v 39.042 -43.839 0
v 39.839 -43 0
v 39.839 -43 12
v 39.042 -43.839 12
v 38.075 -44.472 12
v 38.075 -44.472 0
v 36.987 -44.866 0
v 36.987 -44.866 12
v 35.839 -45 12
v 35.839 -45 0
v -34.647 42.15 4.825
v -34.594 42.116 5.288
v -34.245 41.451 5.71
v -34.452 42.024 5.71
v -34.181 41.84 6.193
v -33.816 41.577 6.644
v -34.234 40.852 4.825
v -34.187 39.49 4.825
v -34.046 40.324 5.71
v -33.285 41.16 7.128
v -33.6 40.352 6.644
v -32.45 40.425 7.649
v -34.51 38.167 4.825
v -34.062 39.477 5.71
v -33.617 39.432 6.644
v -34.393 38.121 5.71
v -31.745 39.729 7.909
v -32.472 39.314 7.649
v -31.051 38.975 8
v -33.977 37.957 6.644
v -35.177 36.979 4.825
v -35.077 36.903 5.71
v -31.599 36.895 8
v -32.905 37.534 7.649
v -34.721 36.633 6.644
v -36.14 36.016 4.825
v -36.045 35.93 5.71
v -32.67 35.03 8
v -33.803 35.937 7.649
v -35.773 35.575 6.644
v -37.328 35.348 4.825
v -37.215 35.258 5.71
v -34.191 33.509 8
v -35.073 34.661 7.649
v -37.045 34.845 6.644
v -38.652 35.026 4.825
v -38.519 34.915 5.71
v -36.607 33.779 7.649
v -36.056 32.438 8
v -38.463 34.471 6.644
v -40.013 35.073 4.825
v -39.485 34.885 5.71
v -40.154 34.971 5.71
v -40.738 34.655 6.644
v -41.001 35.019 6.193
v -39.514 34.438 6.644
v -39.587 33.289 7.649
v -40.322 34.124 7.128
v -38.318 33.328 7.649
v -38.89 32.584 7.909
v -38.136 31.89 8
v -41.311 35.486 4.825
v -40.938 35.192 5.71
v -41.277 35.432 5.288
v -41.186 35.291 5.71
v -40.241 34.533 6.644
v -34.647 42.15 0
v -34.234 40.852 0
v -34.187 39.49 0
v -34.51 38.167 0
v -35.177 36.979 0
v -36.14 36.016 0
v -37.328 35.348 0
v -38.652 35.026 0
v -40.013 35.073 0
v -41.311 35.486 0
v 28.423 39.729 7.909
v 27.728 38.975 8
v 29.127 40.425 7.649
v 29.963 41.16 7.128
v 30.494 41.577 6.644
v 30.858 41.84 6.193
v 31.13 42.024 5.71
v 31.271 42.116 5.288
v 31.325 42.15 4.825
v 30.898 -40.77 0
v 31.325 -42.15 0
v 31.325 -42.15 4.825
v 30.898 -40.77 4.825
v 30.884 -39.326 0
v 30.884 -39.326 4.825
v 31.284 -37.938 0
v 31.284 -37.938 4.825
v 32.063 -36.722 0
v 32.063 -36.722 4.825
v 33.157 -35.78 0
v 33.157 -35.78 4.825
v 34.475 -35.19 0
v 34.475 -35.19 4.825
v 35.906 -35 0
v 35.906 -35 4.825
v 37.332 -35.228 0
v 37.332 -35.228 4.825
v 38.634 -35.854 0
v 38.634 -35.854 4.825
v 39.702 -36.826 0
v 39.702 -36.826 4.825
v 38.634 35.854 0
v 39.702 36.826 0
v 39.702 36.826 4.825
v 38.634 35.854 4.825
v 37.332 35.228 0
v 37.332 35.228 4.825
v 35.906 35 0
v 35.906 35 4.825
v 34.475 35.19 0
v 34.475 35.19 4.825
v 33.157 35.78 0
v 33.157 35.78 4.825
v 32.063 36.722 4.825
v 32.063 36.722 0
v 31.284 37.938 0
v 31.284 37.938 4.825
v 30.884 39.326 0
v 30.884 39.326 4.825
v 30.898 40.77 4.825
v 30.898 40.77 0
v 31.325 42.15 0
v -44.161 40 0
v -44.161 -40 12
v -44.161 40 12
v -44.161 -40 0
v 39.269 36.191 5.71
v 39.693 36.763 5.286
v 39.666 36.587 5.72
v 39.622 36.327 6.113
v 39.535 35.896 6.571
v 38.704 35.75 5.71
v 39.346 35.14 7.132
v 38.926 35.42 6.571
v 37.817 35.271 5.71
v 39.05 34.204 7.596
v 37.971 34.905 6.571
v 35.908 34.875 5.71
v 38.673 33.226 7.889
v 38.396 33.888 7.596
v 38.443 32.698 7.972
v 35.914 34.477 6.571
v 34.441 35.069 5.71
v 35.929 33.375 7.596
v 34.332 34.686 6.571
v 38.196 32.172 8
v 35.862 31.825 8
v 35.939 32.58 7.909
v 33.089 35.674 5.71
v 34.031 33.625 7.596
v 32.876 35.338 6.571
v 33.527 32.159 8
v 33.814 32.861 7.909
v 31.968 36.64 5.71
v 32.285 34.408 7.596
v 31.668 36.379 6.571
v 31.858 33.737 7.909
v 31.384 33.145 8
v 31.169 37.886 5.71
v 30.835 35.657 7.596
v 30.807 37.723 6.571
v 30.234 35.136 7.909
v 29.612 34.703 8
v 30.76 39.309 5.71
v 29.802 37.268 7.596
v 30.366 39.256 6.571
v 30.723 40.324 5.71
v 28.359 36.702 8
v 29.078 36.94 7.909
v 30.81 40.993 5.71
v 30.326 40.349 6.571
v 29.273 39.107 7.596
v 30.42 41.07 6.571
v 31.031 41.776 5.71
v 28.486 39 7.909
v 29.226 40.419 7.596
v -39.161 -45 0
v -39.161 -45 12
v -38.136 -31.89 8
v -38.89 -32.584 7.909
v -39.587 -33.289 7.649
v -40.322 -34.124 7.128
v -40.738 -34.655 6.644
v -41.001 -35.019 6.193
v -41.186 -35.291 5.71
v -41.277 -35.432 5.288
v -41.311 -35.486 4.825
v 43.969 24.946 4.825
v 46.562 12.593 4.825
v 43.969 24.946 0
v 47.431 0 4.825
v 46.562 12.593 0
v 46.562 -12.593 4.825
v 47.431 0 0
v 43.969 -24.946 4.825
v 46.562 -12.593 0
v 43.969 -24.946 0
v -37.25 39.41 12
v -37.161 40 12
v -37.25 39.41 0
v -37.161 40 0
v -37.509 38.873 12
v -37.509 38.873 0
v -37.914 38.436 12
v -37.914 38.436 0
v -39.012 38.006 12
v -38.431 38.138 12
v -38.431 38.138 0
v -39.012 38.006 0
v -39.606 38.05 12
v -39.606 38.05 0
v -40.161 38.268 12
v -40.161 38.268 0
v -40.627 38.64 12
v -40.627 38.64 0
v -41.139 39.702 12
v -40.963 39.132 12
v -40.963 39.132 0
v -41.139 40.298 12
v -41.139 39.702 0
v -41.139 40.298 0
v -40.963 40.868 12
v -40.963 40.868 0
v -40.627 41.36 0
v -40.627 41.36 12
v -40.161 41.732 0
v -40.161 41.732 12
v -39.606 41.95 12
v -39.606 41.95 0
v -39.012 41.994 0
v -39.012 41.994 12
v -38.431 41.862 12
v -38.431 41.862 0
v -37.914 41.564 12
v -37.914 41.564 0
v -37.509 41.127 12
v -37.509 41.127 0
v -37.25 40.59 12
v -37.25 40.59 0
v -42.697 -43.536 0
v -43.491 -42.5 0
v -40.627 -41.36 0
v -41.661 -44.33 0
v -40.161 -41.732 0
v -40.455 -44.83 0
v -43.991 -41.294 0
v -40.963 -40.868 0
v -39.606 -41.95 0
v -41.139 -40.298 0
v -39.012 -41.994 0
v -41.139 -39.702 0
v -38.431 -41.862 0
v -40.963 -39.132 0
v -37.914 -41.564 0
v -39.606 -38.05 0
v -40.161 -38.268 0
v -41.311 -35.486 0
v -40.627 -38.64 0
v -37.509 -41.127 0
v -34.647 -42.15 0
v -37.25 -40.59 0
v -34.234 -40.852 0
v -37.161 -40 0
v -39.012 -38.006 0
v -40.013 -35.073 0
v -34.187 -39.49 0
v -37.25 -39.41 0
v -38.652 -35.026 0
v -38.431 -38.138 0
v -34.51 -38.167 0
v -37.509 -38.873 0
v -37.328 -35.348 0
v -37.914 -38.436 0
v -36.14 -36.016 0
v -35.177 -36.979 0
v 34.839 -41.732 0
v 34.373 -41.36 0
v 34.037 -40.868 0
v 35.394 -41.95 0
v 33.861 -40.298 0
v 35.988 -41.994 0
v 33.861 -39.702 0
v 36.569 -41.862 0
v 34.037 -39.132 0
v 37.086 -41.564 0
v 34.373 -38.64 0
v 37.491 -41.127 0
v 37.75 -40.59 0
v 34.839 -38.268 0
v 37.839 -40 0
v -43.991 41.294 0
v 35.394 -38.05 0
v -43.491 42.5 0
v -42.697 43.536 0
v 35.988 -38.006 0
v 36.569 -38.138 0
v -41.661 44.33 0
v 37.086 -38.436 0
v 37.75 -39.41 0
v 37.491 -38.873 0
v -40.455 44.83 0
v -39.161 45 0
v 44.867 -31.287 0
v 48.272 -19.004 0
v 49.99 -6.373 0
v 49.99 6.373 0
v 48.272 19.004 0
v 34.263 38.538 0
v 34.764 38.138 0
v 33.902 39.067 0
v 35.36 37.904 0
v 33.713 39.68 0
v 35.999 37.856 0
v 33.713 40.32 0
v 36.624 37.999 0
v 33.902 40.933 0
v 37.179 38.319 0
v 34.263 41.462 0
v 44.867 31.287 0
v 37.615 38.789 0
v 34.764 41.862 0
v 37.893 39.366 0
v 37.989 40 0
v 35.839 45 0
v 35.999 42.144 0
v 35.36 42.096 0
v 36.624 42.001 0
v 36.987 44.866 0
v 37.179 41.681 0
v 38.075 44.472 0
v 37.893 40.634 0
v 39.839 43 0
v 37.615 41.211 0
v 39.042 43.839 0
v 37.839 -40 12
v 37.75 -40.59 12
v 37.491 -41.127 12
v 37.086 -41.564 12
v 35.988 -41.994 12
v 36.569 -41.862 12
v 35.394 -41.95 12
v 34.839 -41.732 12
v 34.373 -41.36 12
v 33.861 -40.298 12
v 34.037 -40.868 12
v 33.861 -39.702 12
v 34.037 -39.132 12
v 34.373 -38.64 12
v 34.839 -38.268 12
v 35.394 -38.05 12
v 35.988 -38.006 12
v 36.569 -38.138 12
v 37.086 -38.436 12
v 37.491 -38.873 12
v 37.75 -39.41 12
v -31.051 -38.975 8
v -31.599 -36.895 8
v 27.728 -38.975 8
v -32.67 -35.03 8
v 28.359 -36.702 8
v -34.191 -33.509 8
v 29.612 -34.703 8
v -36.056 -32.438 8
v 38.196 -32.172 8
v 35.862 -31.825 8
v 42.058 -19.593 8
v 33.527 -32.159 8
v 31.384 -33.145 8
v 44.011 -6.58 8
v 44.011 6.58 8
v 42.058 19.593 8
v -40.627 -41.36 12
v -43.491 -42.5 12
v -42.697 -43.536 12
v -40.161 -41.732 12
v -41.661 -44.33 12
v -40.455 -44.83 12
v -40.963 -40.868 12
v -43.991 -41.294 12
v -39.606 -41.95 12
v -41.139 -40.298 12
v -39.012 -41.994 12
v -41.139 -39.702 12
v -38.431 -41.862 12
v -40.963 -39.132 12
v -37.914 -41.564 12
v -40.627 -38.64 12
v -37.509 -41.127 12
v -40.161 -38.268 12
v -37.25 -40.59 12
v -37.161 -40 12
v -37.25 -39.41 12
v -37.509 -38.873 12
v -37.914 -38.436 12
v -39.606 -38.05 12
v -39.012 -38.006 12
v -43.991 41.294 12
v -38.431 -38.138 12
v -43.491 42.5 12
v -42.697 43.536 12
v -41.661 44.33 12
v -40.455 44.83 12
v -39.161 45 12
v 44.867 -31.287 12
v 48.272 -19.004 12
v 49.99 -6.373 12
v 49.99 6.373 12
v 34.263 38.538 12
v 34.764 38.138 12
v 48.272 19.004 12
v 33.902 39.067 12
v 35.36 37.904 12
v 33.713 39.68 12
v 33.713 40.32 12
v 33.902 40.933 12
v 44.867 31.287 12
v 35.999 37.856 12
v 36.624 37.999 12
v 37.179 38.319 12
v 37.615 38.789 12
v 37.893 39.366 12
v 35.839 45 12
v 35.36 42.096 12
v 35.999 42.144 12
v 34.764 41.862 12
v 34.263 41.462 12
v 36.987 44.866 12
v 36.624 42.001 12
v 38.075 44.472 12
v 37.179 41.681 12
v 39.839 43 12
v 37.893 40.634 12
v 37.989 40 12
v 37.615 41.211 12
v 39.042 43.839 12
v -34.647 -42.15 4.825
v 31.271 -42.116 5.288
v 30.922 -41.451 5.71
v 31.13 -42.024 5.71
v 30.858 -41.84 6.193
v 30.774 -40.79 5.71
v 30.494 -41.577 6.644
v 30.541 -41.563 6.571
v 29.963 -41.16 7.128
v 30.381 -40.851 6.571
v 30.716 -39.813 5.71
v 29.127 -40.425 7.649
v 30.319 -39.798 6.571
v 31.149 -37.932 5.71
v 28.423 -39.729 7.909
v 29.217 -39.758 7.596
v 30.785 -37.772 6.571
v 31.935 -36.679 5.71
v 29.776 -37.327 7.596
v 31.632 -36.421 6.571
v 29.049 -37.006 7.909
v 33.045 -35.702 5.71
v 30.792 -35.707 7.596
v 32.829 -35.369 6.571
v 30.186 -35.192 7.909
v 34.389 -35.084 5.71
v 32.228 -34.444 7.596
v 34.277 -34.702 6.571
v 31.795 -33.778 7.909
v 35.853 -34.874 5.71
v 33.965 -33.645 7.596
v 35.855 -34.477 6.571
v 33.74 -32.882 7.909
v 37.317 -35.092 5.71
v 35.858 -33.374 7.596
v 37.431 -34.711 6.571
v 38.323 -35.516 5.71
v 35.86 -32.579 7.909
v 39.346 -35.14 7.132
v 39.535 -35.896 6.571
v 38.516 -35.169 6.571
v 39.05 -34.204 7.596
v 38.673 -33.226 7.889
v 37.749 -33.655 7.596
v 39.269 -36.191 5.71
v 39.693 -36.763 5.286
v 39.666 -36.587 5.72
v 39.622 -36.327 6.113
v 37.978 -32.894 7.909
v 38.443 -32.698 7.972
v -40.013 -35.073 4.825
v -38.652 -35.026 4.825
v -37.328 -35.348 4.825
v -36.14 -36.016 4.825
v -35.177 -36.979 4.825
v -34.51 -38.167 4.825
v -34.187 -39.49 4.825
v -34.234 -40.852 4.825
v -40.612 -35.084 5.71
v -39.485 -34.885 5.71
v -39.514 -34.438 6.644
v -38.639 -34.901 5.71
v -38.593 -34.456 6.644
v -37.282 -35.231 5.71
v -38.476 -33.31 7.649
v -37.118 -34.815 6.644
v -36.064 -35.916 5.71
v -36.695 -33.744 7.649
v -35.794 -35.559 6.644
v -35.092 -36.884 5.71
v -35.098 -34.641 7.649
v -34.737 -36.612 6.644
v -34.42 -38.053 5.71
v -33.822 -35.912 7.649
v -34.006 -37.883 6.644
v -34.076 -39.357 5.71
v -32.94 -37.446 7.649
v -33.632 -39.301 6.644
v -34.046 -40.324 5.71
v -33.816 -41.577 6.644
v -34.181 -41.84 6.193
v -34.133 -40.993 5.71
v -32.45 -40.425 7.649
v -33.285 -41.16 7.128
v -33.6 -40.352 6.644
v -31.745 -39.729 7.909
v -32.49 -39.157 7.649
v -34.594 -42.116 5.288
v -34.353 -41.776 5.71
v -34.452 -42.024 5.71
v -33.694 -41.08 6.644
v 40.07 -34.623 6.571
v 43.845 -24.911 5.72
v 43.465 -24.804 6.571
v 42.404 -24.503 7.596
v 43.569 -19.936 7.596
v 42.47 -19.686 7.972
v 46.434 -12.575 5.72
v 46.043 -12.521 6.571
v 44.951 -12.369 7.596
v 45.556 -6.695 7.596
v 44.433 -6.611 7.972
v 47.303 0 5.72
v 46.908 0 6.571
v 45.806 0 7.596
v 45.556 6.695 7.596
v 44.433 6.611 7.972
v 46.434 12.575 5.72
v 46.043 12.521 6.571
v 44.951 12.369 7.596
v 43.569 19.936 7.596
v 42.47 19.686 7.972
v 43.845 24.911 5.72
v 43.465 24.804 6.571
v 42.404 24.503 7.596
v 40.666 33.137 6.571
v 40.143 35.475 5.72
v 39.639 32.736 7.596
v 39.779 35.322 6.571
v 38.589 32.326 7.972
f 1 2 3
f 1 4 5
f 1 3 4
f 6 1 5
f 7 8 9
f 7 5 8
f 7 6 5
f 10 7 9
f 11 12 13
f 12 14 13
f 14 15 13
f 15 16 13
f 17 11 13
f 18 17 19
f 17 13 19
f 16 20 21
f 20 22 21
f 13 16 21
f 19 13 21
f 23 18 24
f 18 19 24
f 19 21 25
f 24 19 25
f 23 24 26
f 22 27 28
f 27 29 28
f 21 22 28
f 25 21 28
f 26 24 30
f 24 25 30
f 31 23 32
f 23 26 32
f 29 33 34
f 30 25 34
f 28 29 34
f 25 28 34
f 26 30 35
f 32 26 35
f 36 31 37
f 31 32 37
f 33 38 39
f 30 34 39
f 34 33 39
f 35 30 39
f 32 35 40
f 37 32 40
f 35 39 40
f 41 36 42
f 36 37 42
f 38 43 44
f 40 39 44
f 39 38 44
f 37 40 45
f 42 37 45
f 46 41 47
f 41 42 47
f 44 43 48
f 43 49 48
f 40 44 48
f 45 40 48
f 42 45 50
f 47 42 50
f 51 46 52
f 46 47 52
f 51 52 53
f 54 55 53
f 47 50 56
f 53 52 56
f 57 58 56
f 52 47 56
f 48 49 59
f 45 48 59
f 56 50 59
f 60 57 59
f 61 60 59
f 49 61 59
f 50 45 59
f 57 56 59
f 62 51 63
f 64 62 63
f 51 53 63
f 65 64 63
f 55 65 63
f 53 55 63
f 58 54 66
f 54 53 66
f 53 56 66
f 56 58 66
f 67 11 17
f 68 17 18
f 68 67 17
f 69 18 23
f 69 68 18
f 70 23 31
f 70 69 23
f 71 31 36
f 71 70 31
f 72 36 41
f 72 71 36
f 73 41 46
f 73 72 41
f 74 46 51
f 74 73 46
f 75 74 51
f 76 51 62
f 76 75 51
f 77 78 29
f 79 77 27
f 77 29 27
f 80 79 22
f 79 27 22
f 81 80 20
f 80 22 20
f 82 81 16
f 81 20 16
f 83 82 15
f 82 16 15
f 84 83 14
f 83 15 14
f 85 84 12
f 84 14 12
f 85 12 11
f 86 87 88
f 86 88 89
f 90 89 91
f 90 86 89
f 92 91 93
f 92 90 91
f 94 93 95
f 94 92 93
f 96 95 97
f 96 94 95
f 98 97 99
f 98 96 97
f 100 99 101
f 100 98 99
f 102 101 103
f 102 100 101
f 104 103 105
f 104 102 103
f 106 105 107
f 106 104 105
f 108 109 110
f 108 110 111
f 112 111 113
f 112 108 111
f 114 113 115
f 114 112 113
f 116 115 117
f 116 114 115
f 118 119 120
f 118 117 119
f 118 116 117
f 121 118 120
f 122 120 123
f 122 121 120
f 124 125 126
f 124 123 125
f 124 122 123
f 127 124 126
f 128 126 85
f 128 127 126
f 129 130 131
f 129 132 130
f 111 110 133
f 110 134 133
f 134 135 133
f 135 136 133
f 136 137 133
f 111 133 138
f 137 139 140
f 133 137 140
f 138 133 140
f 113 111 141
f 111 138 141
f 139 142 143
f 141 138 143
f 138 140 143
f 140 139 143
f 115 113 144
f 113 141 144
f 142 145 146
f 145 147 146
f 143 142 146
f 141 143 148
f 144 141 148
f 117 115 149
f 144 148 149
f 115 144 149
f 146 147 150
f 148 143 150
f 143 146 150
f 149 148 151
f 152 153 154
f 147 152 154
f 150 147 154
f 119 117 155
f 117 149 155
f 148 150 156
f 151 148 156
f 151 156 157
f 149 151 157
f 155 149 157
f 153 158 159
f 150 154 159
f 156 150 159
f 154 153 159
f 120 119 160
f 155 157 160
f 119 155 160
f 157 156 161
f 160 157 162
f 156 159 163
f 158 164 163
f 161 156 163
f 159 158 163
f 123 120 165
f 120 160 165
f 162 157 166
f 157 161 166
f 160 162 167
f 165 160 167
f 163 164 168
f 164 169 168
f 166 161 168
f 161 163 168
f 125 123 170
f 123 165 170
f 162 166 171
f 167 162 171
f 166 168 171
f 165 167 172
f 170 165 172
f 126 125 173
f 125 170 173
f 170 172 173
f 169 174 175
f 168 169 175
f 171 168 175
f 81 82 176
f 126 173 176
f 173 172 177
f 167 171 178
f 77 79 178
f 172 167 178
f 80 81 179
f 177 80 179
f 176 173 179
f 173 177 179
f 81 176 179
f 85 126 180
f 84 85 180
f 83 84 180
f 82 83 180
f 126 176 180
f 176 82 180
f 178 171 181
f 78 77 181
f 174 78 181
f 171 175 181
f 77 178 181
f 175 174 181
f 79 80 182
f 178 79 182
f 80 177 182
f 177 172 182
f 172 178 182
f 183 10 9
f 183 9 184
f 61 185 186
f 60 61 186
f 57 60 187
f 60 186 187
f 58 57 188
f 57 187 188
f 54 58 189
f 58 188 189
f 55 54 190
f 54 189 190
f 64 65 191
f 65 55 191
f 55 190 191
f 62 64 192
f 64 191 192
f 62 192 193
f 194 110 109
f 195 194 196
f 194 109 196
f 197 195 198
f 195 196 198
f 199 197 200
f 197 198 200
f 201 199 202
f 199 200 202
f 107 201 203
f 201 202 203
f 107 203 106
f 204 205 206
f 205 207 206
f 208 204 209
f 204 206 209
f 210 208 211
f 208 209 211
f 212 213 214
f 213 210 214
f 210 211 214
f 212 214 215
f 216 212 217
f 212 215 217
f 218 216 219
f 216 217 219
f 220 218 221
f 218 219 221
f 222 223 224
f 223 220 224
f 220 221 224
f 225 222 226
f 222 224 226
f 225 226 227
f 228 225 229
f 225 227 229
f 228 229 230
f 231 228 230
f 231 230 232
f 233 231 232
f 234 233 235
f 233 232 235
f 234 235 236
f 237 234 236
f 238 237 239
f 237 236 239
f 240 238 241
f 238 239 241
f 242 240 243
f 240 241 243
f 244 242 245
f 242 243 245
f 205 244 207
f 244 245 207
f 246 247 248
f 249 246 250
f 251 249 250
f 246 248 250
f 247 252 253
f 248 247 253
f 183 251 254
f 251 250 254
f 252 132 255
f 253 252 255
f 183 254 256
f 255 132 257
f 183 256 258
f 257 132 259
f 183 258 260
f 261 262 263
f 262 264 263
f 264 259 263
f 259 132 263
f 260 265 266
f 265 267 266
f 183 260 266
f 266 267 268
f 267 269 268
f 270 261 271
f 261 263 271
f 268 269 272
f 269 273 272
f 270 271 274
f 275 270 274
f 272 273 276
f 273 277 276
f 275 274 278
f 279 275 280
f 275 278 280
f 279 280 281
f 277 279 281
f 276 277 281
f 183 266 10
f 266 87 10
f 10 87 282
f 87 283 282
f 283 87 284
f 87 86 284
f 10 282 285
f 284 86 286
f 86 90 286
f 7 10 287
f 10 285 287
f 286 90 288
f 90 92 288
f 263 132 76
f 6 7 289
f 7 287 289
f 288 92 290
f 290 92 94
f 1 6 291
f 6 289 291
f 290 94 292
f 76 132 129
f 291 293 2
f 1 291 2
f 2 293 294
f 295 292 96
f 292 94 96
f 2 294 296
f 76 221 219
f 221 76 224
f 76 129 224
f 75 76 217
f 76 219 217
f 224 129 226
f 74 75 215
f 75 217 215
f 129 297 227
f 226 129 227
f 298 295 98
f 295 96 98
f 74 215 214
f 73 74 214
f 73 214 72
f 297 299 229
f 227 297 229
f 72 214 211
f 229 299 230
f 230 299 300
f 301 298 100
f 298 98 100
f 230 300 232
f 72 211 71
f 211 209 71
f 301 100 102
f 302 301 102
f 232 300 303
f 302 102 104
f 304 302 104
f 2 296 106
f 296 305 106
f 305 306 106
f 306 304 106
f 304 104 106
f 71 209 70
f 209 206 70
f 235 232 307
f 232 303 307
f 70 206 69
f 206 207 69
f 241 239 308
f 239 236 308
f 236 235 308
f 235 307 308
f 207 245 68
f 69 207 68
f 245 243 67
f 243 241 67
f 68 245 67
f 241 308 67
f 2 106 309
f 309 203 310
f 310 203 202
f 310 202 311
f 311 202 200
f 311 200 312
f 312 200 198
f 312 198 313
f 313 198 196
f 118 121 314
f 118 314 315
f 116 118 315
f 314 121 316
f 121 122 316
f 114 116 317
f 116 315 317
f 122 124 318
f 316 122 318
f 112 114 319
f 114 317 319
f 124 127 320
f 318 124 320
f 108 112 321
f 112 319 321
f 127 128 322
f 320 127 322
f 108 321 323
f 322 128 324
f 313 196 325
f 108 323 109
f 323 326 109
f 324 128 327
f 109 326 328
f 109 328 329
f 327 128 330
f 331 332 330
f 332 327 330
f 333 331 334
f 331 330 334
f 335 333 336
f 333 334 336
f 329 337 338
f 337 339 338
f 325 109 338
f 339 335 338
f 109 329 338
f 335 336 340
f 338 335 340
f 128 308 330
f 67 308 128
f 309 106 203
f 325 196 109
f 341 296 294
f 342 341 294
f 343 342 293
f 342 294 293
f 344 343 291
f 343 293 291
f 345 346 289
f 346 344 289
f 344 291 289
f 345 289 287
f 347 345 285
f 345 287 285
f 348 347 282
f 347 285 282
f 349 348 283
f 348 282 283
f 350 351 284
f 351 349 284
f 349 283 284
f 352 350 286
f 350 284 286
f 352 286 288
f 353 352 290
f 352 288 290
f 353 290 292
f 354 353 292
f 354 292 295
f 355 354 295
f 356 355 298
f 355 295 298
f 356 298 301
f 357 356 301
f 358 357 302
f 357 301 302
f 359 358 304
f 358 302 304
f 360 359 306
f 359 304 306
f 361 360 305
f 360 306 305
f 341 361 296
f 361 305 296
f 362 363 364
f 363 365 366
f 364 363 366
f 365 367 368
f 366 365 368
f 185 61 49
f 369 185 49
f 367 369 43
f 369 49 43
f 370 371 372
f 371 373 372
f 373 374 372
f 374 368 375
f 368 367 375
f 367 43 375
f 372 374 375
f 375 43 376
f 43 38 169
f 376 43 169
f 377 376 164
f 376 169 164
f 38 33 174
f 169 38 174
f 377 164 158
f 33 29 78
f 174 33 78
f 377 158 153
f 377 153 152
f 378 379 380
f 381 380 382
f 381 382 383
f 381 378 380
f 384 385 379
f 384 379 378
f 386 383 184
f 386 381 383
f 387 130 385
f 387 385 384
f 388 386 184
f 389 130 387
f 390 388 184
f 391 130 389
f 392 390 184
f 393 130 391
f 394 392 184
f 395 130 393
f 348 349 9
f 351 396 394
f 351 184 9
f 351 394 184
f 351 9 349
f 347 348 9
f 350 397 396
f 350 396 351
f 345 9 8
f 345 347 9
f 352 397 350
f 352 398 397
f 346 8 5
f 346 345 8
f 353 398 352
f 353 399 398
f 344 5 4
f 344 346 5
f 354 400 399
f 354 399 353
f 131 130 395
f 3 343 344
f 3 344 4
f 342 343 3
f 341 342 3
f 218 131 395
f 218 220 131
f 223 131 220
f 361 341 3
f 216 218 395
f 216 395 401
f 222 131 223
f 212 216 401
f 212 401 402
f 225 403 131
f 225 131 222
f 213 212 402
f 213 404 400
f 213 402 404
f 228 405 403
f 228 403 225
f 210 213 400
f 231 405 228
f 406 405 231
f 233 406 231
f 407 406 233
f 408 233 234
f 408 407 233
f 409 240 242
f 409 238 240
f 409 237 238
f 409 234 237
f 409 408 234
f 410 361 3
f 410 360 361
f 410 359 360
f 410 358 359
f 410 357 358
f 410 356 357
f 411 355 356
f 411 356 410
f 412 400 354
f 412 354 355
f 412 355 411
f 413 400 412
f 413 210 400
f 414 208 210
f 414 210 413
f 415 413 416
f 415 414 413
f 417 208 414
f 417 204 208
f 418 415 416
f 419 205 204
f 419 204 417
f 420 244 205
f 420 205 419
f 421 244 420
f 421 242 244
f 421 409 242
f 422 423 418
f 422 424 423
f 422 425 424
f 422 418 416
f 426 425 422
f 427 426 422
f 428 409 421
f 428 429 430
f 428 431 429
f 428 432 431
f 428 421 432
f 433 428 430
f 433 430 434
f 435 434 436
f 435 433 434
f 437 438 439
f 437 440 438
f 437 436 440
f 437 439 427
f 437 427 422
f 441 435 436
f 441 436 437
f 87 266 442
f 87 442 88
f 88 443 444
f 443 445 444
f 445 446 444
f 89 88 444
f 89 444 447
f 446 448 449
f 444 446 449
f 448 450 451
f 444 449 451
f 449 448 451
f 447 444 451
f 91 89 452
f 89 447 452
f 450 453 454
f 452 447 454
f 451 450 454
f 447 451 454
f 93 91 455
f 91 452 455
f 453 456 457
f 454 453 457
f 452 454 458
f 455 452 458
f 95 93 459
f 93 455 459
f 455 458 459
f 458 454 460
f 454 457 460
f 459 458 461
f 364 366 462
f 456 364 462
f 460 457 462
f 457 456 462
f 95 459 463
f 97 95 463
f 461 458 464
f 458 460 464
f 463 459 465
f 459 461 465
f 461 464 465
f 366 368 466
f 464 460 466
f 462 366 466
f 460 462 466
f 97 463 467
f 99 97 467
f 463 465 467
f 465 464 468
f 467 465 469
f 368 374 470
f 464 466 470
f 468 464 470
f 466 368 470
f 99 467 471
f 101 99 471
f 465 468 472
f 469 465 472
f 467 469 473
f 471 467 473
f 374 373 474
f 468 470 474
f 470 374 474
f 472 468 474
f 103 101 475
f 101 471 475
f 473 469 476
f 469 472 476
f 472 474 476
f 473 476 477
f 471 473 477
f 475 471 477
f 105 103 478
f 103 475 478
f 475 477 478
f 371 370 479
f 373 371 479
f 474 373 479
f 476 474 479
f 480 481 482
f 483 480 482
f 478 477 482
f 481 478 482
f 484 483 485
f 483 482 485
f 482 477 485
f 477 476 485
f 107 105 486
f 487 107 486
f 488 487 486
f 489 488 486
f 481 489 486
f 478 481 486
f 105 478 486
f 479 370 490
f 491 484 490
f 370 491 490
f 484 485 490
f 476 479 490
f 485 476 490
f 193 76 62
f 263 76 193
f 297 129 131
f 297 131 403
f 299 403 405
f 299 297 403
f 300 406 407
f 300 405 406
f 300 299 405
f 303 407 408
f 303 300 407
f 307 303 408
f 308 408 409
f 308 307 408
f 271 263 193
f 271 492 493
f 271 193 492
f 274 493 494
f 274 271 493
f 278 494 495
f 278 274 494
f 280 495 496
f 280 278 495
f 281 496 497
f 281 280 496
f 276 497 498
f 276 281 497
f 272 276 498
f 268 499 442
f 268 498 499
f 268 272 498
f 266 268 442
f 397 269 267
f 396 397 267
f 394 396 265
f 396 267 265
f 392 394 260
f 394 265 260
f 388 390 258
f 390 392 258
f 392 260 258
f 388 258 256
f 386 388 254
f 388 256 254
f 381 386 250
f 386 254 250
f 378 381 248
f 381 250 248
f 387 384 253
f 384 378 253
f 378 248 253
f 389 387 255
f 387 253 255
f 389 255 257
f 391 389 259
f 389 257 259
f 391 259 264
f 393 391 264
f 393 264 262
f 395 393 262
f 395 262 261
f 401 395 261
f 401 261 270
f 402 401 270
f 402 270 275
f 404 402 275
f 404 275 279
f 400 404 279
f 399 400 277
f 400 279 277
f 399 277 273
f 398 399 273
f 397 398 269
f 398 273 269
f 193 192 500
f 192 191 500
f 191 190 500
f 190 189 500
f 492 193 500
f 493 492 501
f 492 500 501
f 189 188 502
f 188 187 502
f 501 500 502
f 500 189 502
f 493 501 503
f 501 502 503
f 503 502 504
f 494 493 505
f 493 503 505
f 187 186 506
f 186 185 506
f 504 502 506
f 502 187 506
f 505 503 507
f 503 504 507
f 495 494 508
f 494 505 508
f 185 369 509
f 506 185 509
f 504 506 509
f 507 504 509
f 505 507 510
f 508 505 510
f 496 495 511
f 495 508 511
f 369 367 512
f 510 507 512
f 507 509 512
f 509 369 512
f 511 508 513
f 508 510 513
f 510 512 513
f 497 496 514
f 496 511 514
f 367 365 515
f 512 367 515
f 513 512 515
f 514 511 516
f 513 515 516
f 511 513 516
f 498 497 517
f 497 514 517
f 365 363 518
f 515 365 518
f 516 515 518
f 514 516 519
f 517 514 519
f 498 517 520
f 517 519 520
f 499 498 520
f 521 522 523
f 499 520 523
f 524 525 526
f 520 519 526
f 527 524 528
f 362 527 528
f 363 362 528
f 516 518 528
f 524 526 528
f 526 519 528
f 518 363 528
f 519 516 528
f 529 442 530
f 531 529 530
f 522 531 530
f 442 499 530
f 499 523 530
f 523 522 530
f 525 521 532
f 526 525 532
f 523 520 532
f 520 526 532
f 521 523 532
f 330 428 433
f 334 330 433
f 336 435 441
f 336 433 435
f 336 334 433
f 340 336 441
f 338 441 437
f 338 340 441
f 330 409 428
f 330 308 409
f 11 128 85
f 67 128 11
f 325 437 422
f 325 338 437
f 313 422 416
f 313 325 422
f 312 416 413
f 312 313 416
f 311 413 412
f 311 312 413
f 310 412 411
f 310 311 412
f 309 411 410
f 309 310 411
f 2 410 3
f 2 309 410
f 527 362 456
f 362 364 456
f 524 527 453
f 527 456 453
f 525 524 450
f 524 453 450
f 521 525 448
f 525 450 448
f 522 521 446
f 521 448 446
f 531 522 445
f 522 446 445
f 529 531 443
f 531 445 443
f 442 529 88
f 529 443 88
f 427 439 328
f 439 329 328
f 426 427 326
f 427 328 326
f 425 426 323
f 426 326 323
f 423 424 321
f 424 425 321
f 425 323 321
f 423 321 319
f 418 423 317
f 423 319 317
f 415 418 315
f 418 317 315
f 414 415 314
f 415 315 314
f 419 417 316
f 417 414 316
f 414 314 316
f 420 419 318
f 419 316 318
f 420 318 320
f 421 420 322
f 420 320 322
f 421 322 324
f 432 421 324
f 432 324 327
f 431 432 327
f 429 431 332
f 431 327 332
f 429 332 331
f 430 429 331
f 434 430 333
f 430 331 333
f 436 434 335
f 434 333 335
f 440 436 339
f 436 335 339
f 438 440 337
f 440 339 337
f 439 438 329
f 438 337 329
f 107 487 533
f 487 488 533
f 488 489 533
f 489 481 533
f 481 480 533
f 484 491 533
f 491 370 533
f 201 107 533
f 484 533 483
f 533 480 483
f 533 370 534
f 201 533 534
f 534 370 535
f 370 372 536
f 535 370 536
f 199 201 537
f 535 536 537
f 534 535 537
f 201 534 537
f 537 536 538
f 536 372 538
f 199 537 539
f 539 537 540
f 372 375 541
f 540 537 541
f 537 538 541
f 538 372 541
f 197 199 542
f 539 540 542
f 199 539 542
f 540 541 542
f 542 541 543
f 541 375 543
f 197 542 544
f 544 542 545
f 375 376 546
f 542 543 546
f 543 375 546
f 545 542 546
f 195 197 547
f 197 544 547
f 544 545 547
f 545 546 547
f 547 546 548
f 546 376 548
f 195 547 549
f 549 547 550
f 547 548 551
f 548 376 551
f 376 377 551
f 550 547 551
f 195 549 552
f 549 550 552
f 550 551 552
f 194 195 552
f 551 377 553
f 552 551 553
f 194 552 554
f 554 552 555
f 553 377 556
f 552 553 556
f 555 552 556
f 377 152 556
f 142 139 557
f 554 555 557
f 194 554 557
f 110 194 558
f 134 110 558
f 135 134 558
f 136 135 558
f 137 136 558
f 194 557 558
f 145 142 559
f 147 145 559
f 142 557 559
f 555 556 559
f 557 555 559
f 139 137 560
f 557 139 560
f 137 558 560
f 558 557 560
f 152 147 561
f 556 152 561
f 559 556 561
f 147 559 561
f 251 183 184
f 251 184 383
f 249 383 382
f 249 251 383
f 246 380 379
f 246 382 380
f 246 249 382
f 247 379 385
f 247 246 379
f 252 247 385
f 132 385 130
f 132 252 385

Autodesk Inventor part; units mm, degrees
ref_plane "YZ Plane" through (0, 0, 0) normal (1, 0, 0) x (0, 1, 0)
ref_plane "XZ Plane" through (0, 0, 0) normal (0, 1, 0) x (-1, 0, 0)
ref_plane "XY Plane" through (0, 0, 0) normal (0, 0, 1) x (1, 0, 0)
sketch "Sketch1" plane through (0, 0, 0) normal (0, 0, 1) x (1, 0, 0)
  line L0 (-44.1613, -40) -> (-44.1613, 40) projected
  arc A0 (-39.1613, 45) -> (-44.1613, 40) centre (-39.1613, 40) ccw projected
  line L1 (-39.1613, 45) -> (35.8387, 45) projected
  arc A1 (39.8387, 43) -> (35.8387, 45) centre (35.8387, 40) ccw projected
  arc A2 (39.8387, -43) -> (39.8387, 43) centre (-44.1612, 0) ccw projected
  arc A3 (35.8387, -45) -> (39.8387, -43) centre (35.8387, -39.9999) ccw projected
  line L2 (35.8387, -45) -> (-39.1613, -45) projected
  arc A4 (-44.1613, -40) -> (-39.1613, -45) centre (-39.1613, -40) ccw projected
  circle A5 centre (-39.1613, -40) radius 2 projected
  circle A6 centre (-39.1613, 40) radius 2 projected
  circle A7 centre (35.8387, 40) radius 2.15 projected
  circle A8 centre (35.8387, -40) radius 2 projected
  arc A9 (37.5587, 41.29) -> (35.8387, 42.15) centre (35.8387, 40) ccw
  line L3 (35.8387, 42.15) -> (-39.1613, 42.15)
  arc A10 (-39.1613, 42.15) -> (-41.3113, 40) centre (-39.1613, 40) ccw
  line L4 (-41.3113, 40) -> (-41.3113, -40)
  arc A11 (-41.3113, -40) -> (-39.1613, -42.15) centre (-39.1613, -40) ccw
  line L5 (-39.1613, -42.15) -> (35.8387, -42.15)
  arc A12 (35.8387, -42.15) -> (37.5587, -41.29) centre (35.8387, -39.9999) ccw
  arc A13 (37.3698, -41.7362) -> (37.3698, 41.7362) centre (-44.1612, 0) ccw
  circle A14 centre (-39.1613, 40) radius 5
  circle A15 centre (35.8387, 40) radius 5
  circle A16 centre (35.8387, -40) radius 5
  circle A17 centre (-39.1613, -40) radius 5
  point P0 (0, 0)
  point P1 (39.8387, -43)
  point P2 (31.3246, 42.15)
  point P3 (39.7021, 36.826)
  point P4 (39.7021, -36.826)
  point P5 (31.3246, -42.15)
  point P6 (-34.6471, -42.15)
  point P7 (-41.3113, -35.4859)
  point P8 (-41.3113, 35.4859)
  point P9 (-34.6471, 42.15)
extrude "Extrusion1" add sketch "Sketch1" along normal blind 8 contours A17 L4 A11 L5 A4 | L0 A14 L4 A17 | A0 A14 L3 A10 L4 | A17 L5 A16 L2 | A17 L5 A11 L4 | L1 A15 L3 A14 | L4 A10 L3 A14 | A16 A2 A3 | A1 A2 A15 A13 A7 L3 | L3 A7 A13 A15 | A16 A13 A15 A2
sketch "Sketch2" plane through (0, 0, 8) normal (0, 0, 1) x (1, 0, 0)
  arc A0 (-39.1613, 45) -> (-44.1613, 40) centre (-39.1613, 40) ccw projected
  line L0 (-44.1613, 40) -> (-44.1613, -40) projected
  arc A1 (-44.1613, -40) -> (-39.1613, -45) centre (-39.1613, -40) ccw projected
  line L1 (-39.1613, -45) -> (35.8387, -45) projected
  arc A2 (35.8387, -45) -> (39.8387, -43) centre (35.8387, -39.9999) ccw projected
  arc A3 (39.8387, -43) -> (39.8387, 43) centre (-44.1612, 0) ccw projected
  arc A4 (39.8387, 43) -> (35.8387, 45) centre (35.8387, 40) ccw projected
  line L2 (35.8387, 45) -> (-39.1613, 45) projected
  circle A5 centre (35.8387, 40) radius 2.15 projected
  circle A6 centre (35.8387, -40) radius 2 projected
  circle A7 centre (-39.1613, -40) radius 2 projected
  circle A8 centre (-39.1613, 40) radius 2 projected
  arc A9 (31.3246, 42.15) -> (39.7021, 36.826) centre (35.8387, 40) ccw projected
  arc A10 (39.7021, -36.826) -> (39.7021, 36.826) centre (-44.1612, 0) ccw projected
  arc A11 (39.7021, -36.826) -> (31.3246, -42.15) centre (35.8387, -40) ccw projected
  line L3 (31.3246, -42.15) -> (-34.6471, -42.15) projected
  arc A12 (-34.6471, -42.15) -> (-41.3113, -35.4859) centre (-39.1613, -40) ccw projected
  line L4 (-41.3113, -35.4859) -> (-41.3113, 35.4859) projected
  arc A13 (-41.3113, 35.4859) -> (-34.6471, 42.15) centre (-39.1613, 40) ccw projected
  line L5 (-34.6471, 42.15) -> (31.3246, 42.15) projected
  point P0 (0, 0)
extrude "Extrusion2" add sketch "Sketch2" along normal blind 4 contours L2 A4 A3 A2 L1 A1 L0 A0 | A9 A10 A11 L3 A12 L4 A13 L5
fillet "Fillet1" radius 3.175 8 edges at (-1.6613, 42.15, 8) (-41.3113, 0, 8) (-1.6613, -42.15, 8) (47.4314, 0, 8) (-35.6257, -36.4645, 8) (-35.6257, 36.4645, 8) (33.1569, 35.7801, 8) (33.1569, -35.7801, 8)
properties part number "Bottom Case"
